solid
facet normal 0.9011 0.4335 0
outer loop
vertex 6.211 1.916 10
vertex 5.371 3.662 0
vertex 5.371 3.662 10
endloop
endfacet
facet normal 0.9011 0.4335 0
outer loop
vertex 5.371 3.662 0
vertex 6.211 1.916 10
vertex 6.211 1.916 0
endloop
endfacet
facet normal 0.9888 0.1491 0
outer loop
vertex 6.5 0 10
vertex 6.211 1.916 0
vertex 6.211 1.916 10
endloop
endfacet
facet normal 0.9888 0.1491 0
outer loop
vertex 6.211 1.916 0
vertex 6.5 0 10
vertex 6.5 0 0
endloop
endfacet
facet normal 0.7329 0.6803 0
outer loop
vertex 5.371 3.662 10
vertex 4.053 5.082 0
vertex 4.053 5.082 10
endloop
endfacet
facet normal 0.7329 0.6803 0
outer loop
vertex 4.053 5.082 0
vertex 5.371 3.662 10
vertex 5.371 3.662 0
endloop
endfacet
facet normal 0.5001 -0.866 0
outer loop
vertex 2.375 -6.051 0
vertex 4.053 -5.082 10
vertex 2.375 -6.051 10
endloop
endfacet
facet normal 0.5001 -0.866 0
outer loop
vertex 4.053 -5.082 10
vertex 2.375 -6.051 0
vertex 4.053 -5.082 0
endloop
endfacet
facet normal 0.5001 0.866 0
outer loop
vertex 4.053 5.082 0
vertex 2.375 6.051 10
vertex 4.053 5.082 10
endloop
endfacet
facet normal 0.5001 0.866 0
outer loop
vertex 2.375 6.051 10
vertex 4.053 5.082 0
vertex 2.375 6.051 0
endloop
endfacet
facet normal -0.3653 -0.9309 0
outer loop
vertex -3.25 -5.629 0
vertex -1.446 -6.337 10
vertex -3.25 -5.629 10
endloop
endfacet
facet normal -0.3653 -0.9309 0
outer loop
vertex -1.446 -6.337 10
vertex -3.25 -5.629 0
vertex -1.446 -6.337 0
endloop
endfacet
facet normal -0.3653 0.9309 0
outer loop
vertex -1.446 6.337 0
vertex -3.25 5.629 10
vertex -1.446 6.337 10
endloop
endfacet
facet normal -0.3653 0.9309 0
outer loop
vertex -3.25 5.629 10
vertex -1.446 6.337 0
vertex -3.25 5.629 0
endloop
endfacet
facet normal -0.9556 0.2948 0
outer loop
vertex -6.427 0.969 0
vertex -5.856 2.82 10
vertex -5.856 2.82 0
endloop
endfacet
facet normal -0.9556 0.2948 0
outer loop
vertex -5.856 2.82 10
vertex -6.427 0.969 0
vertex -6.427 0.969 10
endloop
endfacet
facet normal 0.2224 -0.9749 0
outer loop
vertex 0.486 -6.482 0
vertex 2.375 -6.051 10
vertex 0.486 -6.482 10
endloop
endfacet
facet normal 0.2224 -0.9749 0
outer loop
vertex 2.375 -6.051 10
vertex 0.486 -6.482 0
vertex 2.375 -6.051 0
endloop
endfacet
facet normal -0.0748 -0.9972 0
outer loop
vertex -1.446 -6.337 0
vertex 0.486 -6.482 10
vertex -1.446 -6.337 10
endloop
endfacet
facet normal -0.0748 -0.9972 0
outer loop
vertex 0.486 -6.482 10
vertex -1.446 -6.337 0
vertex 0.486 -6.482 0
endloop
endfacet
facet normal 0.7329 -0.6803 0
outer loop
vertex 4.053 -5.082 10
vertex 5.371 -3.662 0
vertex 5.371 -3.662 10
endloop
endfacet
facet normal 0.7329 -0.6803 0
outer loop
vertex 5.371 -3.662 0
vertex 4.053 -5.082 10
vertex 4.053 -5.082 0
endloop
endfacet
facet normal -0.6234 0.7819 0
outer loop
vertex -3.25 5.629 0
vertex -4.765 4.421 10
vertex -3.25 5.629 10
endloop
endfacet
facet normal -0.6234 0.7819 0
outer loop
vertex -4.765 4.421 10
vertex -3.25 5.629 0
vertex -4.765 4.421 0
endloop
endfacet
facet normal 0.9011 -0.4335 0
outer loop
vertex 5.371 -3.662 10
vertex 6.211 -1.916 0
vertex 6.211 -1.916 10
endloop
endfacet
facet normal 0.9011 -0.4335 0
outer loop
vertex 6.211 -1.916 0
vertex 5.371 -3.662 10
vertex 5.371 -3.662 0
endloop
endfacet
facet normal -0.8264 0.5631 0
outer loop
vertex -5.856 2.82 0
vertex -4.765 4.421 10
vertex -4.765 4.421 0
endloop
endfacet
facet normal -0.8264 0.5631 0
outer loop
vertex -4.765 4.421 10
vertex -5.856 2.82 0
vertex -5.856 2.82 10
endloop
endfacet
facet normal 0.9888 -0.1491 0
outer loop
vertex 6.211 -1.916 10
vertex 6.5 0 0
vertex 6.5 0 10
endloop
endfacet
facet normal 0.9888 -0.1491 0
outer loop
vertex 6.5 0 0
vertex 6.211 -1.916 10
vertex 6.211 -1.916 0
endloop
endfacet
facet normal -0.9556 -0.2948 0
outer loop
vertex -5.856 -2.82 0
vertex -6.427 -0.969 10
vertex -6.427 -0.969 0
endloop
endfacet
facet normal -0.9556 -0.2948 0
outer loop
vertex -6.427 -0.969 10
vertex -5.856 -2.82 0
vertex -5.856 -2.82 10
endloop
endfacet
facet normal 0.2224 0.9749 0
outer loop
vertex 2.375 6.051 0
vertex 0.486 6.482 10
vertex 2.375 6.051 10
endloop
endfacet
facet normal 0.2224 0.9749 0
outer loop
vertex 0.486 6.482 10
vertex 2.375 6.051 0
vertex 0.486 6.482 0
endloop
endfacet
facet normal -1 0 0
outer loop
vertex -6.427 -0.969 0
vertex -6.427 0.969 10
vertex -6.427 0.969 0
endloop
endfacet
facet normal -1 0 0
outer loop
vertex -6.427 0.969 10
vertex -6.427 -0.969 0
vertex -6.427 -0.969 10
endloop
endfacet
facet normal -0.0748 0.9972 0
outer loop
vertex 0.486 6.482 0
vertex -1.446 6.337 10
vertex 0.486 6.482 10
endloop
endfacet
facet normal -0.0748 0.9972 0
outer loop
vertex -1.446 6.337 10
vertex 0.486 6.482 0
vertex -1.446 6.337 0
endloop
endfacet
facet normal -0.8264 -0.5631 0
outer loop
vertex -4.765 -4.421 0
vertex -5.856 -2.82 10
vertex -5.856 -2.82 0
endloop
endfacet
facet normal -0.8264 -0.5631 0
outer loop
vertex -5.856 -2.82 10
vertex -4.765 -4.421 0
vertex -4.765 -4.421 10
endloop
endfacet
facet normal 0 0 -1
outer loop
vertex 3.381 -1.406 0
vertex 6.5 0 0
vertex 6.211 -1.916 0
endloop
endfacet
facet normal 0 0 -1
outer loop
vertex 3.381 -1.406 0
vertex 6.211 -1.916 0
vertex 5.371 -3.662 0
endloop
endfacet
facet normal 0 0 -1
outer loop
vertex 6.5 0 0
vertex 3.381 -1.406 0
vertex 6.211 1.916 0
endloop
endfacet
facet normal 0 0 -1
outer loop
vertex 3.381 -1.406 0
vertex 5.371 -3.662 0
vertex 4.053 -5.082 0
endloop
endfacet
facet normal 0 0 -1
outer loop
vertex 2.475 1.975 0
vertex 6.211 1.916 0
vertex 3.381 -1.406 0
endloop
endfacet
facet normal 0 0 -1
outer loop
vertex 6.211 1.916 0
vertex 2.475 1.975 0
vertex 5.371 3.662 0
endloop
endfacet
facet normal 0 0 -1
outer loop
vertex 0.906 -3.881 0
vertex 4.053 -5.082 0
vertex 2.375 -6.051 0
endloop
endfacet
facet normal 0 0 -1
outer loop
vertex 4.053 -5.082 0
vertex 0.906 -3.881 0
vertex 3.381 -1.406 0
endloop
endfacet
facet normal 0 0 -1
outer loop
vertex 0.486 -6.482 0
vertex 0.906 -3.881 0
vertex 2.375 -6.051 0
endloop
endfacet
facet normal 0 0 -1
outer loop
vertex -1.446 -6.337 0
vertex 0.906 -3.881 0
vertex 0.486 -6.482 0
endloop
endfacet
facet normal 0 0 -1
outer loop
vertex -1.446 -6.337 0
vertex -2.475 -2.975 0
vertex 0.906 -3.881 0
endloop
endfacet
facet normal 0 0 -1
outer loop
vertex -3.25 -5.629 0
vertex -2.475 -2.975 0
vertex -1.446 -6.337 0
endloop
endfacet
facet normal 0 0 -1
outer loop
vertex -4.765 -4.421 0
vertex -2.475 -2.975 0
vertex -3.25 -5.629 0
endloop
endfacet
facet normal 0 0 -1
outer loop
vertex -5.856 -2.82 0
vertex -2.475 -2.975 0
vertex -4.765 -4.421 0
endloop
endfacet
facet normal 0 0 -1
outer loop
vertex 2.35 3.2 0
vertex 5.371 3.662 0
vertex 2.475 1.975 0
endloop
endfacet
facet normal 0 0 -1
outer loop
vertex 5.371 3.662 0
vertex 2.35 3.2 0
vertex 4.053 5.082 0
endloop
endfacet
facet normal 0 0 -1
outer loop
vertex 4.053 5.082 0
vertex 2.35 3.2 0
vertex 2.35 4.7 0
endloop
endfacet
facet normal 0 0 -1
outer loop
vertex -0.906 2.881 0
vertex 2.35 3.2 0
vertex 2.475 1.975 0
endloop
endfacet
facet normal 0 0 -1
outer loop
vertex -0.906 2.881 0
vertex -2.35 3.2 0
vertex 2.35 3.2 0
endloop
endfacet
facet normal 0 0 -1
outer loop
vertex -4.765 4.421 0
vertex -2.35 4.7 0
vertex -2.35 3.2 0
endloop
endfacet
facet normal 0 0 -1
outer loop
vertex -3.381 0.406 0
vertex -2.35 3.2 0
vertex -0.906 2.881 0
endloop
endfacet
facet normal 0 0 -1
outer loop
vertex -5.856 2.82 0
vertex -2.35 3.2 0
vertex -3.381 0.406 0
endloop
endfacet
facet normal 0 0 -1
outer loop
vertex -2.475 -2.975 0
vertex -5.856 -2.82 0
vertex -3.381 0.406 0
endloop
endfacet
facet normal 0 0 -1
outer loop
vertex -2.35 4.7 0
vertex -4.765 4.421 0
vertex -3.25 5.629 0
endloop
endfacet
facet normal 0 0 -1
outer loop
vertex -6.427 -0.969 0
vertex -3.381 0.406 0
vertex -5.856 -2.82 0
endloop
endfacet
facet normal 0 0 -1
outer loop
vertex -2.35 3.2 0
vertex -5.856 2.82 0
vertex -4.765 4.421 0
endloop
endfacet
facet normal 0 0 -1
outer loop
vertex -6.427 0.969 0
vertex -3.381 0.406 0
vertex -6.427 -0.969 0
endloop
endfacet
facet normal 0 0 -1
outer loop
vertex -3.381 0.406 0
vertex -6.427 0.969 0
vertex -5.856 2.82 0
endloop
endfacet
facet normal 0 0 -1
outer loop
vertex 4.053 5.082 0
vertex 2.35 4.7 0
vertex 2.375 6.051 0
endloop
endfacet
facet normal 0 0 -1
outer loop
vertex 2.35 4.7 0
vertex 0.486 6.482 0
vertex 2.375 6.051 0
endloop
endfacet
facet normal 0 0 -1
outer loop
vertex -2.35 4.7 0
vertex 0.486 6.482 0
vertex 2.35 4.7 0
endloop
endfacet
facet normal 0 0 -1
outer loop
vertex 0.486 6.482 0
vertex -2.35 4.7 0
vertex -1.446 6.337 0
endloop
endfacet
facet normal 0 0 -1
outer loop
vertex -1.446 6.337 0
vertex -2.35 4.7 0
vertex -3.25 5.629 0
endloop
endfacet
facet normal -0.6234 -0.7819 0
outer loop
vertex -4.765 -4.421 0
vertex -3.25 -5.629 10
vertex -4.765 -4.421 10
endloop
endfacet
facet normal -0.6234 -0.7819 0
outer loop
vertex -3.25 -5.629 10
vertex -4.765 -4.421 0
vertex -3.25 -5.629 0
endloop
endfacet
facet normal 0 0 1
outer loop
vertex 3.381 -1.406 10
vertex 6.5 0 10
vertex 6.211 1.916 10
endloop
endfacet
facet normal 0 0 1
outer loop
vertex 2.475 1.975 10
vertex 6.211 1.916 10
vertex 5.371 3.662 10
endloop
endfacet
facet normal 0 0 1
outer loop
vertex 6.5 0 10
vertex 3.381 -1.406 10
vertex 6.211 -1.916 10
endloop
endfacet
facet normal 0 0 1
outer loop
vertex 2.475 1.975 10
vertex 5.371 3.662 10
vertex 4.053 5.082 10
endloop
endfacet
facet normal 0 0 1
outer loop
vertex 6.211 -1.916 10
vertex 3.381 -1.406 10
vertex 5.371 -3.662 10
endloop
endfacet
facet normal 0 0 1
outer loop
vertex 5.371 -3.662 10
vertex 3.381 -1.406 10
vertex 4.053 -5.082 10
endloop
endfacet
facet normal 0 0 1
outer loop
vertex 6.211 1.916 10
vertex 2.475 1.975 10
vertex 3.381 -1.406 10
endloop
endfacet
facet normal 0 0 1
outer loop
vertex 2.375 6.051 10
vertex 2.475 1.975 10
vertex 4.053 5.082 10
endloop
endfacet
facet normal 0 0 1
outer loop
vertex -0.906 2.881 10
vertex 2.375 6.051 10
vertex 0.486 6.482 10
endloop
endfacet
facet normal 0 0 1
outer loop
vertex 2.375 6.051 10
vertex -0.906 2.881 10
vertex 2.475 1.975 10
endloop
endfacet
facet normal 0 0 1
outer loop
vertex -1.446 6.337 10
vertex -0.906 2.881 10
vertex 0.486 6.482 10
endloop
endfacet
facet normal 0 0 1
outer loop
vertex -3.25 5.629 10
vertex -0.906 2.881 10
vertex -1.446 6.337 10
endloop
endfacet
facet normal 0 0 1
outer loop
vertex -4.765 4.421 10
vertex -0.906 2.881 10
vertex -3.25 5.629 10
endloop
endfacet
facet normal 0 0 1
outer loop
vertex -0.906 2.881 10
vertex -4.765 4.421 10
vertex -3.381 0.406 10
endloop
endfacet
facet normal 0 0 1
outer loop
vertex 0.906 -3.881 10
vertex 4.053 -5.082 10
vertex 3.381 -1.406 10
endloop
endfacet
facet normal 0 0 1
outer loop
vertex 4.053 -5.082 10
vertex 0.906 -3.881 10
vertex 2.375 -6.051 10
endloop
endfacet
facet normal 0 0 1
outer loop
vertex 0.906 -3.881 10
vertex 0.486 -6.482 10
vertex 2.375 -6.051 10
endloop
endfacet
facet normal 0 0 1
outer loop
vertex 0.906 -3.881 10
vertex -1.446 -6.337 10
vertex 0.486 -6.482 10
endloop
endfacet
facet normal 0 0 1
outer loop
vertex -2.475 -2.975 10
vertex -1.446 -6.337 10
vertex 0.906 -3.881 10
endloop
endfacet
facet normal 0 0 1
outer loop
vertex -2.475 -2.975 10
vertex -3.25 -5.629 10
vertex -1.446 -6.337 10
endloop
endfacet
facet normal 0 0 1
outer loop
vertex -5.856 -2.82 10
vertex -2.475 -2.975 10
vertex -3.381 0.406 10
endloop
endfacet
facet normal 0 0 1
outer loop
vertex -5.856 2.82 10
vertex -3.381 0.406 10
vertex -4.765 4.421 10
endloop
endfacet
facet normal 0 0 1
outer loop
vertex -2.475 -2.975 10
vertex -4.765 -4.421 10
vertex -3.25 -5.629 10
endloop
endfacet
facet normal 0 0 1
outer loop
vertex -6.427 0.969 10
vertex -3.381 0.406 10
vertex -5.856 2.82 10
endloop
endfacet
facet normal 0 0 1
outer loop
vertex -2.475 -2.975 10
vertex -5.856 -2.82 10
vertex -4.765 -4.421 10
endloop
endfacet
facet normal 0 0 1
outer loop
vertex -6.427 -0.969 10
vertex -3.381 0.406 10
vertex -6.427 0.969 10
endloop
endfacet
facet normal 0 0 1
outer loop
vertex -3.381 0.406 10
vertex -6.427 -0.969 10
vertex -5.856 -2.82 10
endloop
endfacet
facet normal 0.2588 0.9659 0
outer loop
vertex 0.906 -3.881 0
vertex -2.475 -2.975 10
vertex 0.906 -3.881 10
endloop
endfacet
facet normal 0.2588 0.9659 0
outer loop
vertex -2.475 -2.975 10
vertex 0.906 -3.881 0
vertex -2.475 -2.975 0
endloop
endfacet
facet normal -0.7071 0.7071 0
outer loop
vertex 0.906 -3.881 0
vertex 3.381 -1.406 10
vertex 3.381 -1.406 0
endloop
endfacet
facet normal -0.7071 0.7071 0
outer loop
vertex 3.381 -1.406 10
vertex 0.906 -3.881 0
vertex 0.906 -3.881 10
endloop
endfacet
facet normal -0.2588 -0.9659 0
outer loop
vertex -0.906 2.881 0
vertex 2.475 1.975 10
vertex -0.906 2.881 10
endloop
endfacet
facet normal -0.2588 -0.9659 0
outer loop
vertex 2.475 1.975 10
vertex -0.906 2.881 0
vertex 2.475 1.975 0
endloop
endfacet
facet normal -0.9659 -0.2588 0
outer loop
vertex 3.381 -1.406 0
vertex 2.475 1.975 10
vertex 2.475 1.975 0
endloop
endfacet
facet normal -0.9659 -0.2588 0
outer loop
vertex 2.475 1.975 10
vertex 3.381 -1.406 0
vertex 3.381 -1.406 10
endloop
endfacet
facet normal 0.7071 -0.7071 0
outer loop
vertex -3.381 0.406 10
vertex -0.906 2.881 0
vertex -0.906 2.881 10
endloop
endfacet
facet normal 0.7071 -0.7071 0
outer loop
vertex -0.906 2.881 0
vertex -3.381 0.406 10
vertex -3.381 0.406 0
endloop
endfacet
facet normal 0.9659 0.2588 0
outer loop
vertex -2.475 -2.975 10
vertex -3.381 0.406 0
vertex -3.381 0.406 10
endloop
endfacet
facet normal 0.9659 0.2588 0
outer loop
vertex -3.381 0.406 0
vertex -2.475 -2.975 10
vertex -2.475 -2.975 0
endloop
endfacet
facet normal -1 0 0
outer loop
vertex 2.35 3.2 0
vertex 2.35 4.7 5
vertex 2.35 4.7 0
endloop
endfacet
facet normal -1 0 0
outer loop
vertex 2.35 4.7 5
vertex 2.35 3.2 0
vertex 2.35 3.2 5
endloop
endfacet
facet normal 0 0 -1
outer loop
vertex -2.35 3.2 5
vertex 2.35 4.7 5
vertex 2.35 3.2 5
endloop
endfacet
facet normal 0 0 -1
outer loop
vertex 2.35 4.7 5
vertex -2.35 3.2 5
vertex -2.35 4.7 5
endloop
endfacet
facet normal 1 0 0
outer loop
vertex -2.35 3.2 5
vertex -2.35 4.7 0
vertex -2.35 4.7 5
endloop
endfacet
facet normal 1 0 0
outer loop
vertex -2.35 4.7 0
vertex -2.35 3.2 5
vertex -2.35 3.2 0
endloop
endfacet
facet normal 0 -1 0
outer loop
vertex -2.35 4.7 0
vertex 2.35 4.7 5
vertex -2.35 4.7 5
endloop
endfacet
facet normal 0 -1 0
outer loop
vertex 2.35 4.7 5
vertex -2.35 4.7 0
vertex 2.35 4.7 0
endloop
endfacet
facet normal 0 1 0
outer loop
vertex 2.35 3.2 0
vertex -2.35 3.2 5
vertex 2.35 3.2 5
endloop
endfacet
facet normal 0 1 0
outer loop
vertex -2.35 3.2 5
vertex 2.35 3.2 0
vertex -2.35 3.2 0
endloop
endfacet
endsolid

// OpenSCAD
//This makes a holder for the stethoscope's spring.
//
//Two need to be made, one with a negative and one with a positive rotation

$rotate=-15;

difference() {
cylinder(r=6.5,h=10); //tube housing outer shell
translate([0,-0.50,0]) rotate([0,0,$rotate]) cylinder(r=3.5,h=11,$fn=6);//ear tube diameter
translate([-4.7/2,3.2,0]) cube([4.7,1.5,5]);
    }
